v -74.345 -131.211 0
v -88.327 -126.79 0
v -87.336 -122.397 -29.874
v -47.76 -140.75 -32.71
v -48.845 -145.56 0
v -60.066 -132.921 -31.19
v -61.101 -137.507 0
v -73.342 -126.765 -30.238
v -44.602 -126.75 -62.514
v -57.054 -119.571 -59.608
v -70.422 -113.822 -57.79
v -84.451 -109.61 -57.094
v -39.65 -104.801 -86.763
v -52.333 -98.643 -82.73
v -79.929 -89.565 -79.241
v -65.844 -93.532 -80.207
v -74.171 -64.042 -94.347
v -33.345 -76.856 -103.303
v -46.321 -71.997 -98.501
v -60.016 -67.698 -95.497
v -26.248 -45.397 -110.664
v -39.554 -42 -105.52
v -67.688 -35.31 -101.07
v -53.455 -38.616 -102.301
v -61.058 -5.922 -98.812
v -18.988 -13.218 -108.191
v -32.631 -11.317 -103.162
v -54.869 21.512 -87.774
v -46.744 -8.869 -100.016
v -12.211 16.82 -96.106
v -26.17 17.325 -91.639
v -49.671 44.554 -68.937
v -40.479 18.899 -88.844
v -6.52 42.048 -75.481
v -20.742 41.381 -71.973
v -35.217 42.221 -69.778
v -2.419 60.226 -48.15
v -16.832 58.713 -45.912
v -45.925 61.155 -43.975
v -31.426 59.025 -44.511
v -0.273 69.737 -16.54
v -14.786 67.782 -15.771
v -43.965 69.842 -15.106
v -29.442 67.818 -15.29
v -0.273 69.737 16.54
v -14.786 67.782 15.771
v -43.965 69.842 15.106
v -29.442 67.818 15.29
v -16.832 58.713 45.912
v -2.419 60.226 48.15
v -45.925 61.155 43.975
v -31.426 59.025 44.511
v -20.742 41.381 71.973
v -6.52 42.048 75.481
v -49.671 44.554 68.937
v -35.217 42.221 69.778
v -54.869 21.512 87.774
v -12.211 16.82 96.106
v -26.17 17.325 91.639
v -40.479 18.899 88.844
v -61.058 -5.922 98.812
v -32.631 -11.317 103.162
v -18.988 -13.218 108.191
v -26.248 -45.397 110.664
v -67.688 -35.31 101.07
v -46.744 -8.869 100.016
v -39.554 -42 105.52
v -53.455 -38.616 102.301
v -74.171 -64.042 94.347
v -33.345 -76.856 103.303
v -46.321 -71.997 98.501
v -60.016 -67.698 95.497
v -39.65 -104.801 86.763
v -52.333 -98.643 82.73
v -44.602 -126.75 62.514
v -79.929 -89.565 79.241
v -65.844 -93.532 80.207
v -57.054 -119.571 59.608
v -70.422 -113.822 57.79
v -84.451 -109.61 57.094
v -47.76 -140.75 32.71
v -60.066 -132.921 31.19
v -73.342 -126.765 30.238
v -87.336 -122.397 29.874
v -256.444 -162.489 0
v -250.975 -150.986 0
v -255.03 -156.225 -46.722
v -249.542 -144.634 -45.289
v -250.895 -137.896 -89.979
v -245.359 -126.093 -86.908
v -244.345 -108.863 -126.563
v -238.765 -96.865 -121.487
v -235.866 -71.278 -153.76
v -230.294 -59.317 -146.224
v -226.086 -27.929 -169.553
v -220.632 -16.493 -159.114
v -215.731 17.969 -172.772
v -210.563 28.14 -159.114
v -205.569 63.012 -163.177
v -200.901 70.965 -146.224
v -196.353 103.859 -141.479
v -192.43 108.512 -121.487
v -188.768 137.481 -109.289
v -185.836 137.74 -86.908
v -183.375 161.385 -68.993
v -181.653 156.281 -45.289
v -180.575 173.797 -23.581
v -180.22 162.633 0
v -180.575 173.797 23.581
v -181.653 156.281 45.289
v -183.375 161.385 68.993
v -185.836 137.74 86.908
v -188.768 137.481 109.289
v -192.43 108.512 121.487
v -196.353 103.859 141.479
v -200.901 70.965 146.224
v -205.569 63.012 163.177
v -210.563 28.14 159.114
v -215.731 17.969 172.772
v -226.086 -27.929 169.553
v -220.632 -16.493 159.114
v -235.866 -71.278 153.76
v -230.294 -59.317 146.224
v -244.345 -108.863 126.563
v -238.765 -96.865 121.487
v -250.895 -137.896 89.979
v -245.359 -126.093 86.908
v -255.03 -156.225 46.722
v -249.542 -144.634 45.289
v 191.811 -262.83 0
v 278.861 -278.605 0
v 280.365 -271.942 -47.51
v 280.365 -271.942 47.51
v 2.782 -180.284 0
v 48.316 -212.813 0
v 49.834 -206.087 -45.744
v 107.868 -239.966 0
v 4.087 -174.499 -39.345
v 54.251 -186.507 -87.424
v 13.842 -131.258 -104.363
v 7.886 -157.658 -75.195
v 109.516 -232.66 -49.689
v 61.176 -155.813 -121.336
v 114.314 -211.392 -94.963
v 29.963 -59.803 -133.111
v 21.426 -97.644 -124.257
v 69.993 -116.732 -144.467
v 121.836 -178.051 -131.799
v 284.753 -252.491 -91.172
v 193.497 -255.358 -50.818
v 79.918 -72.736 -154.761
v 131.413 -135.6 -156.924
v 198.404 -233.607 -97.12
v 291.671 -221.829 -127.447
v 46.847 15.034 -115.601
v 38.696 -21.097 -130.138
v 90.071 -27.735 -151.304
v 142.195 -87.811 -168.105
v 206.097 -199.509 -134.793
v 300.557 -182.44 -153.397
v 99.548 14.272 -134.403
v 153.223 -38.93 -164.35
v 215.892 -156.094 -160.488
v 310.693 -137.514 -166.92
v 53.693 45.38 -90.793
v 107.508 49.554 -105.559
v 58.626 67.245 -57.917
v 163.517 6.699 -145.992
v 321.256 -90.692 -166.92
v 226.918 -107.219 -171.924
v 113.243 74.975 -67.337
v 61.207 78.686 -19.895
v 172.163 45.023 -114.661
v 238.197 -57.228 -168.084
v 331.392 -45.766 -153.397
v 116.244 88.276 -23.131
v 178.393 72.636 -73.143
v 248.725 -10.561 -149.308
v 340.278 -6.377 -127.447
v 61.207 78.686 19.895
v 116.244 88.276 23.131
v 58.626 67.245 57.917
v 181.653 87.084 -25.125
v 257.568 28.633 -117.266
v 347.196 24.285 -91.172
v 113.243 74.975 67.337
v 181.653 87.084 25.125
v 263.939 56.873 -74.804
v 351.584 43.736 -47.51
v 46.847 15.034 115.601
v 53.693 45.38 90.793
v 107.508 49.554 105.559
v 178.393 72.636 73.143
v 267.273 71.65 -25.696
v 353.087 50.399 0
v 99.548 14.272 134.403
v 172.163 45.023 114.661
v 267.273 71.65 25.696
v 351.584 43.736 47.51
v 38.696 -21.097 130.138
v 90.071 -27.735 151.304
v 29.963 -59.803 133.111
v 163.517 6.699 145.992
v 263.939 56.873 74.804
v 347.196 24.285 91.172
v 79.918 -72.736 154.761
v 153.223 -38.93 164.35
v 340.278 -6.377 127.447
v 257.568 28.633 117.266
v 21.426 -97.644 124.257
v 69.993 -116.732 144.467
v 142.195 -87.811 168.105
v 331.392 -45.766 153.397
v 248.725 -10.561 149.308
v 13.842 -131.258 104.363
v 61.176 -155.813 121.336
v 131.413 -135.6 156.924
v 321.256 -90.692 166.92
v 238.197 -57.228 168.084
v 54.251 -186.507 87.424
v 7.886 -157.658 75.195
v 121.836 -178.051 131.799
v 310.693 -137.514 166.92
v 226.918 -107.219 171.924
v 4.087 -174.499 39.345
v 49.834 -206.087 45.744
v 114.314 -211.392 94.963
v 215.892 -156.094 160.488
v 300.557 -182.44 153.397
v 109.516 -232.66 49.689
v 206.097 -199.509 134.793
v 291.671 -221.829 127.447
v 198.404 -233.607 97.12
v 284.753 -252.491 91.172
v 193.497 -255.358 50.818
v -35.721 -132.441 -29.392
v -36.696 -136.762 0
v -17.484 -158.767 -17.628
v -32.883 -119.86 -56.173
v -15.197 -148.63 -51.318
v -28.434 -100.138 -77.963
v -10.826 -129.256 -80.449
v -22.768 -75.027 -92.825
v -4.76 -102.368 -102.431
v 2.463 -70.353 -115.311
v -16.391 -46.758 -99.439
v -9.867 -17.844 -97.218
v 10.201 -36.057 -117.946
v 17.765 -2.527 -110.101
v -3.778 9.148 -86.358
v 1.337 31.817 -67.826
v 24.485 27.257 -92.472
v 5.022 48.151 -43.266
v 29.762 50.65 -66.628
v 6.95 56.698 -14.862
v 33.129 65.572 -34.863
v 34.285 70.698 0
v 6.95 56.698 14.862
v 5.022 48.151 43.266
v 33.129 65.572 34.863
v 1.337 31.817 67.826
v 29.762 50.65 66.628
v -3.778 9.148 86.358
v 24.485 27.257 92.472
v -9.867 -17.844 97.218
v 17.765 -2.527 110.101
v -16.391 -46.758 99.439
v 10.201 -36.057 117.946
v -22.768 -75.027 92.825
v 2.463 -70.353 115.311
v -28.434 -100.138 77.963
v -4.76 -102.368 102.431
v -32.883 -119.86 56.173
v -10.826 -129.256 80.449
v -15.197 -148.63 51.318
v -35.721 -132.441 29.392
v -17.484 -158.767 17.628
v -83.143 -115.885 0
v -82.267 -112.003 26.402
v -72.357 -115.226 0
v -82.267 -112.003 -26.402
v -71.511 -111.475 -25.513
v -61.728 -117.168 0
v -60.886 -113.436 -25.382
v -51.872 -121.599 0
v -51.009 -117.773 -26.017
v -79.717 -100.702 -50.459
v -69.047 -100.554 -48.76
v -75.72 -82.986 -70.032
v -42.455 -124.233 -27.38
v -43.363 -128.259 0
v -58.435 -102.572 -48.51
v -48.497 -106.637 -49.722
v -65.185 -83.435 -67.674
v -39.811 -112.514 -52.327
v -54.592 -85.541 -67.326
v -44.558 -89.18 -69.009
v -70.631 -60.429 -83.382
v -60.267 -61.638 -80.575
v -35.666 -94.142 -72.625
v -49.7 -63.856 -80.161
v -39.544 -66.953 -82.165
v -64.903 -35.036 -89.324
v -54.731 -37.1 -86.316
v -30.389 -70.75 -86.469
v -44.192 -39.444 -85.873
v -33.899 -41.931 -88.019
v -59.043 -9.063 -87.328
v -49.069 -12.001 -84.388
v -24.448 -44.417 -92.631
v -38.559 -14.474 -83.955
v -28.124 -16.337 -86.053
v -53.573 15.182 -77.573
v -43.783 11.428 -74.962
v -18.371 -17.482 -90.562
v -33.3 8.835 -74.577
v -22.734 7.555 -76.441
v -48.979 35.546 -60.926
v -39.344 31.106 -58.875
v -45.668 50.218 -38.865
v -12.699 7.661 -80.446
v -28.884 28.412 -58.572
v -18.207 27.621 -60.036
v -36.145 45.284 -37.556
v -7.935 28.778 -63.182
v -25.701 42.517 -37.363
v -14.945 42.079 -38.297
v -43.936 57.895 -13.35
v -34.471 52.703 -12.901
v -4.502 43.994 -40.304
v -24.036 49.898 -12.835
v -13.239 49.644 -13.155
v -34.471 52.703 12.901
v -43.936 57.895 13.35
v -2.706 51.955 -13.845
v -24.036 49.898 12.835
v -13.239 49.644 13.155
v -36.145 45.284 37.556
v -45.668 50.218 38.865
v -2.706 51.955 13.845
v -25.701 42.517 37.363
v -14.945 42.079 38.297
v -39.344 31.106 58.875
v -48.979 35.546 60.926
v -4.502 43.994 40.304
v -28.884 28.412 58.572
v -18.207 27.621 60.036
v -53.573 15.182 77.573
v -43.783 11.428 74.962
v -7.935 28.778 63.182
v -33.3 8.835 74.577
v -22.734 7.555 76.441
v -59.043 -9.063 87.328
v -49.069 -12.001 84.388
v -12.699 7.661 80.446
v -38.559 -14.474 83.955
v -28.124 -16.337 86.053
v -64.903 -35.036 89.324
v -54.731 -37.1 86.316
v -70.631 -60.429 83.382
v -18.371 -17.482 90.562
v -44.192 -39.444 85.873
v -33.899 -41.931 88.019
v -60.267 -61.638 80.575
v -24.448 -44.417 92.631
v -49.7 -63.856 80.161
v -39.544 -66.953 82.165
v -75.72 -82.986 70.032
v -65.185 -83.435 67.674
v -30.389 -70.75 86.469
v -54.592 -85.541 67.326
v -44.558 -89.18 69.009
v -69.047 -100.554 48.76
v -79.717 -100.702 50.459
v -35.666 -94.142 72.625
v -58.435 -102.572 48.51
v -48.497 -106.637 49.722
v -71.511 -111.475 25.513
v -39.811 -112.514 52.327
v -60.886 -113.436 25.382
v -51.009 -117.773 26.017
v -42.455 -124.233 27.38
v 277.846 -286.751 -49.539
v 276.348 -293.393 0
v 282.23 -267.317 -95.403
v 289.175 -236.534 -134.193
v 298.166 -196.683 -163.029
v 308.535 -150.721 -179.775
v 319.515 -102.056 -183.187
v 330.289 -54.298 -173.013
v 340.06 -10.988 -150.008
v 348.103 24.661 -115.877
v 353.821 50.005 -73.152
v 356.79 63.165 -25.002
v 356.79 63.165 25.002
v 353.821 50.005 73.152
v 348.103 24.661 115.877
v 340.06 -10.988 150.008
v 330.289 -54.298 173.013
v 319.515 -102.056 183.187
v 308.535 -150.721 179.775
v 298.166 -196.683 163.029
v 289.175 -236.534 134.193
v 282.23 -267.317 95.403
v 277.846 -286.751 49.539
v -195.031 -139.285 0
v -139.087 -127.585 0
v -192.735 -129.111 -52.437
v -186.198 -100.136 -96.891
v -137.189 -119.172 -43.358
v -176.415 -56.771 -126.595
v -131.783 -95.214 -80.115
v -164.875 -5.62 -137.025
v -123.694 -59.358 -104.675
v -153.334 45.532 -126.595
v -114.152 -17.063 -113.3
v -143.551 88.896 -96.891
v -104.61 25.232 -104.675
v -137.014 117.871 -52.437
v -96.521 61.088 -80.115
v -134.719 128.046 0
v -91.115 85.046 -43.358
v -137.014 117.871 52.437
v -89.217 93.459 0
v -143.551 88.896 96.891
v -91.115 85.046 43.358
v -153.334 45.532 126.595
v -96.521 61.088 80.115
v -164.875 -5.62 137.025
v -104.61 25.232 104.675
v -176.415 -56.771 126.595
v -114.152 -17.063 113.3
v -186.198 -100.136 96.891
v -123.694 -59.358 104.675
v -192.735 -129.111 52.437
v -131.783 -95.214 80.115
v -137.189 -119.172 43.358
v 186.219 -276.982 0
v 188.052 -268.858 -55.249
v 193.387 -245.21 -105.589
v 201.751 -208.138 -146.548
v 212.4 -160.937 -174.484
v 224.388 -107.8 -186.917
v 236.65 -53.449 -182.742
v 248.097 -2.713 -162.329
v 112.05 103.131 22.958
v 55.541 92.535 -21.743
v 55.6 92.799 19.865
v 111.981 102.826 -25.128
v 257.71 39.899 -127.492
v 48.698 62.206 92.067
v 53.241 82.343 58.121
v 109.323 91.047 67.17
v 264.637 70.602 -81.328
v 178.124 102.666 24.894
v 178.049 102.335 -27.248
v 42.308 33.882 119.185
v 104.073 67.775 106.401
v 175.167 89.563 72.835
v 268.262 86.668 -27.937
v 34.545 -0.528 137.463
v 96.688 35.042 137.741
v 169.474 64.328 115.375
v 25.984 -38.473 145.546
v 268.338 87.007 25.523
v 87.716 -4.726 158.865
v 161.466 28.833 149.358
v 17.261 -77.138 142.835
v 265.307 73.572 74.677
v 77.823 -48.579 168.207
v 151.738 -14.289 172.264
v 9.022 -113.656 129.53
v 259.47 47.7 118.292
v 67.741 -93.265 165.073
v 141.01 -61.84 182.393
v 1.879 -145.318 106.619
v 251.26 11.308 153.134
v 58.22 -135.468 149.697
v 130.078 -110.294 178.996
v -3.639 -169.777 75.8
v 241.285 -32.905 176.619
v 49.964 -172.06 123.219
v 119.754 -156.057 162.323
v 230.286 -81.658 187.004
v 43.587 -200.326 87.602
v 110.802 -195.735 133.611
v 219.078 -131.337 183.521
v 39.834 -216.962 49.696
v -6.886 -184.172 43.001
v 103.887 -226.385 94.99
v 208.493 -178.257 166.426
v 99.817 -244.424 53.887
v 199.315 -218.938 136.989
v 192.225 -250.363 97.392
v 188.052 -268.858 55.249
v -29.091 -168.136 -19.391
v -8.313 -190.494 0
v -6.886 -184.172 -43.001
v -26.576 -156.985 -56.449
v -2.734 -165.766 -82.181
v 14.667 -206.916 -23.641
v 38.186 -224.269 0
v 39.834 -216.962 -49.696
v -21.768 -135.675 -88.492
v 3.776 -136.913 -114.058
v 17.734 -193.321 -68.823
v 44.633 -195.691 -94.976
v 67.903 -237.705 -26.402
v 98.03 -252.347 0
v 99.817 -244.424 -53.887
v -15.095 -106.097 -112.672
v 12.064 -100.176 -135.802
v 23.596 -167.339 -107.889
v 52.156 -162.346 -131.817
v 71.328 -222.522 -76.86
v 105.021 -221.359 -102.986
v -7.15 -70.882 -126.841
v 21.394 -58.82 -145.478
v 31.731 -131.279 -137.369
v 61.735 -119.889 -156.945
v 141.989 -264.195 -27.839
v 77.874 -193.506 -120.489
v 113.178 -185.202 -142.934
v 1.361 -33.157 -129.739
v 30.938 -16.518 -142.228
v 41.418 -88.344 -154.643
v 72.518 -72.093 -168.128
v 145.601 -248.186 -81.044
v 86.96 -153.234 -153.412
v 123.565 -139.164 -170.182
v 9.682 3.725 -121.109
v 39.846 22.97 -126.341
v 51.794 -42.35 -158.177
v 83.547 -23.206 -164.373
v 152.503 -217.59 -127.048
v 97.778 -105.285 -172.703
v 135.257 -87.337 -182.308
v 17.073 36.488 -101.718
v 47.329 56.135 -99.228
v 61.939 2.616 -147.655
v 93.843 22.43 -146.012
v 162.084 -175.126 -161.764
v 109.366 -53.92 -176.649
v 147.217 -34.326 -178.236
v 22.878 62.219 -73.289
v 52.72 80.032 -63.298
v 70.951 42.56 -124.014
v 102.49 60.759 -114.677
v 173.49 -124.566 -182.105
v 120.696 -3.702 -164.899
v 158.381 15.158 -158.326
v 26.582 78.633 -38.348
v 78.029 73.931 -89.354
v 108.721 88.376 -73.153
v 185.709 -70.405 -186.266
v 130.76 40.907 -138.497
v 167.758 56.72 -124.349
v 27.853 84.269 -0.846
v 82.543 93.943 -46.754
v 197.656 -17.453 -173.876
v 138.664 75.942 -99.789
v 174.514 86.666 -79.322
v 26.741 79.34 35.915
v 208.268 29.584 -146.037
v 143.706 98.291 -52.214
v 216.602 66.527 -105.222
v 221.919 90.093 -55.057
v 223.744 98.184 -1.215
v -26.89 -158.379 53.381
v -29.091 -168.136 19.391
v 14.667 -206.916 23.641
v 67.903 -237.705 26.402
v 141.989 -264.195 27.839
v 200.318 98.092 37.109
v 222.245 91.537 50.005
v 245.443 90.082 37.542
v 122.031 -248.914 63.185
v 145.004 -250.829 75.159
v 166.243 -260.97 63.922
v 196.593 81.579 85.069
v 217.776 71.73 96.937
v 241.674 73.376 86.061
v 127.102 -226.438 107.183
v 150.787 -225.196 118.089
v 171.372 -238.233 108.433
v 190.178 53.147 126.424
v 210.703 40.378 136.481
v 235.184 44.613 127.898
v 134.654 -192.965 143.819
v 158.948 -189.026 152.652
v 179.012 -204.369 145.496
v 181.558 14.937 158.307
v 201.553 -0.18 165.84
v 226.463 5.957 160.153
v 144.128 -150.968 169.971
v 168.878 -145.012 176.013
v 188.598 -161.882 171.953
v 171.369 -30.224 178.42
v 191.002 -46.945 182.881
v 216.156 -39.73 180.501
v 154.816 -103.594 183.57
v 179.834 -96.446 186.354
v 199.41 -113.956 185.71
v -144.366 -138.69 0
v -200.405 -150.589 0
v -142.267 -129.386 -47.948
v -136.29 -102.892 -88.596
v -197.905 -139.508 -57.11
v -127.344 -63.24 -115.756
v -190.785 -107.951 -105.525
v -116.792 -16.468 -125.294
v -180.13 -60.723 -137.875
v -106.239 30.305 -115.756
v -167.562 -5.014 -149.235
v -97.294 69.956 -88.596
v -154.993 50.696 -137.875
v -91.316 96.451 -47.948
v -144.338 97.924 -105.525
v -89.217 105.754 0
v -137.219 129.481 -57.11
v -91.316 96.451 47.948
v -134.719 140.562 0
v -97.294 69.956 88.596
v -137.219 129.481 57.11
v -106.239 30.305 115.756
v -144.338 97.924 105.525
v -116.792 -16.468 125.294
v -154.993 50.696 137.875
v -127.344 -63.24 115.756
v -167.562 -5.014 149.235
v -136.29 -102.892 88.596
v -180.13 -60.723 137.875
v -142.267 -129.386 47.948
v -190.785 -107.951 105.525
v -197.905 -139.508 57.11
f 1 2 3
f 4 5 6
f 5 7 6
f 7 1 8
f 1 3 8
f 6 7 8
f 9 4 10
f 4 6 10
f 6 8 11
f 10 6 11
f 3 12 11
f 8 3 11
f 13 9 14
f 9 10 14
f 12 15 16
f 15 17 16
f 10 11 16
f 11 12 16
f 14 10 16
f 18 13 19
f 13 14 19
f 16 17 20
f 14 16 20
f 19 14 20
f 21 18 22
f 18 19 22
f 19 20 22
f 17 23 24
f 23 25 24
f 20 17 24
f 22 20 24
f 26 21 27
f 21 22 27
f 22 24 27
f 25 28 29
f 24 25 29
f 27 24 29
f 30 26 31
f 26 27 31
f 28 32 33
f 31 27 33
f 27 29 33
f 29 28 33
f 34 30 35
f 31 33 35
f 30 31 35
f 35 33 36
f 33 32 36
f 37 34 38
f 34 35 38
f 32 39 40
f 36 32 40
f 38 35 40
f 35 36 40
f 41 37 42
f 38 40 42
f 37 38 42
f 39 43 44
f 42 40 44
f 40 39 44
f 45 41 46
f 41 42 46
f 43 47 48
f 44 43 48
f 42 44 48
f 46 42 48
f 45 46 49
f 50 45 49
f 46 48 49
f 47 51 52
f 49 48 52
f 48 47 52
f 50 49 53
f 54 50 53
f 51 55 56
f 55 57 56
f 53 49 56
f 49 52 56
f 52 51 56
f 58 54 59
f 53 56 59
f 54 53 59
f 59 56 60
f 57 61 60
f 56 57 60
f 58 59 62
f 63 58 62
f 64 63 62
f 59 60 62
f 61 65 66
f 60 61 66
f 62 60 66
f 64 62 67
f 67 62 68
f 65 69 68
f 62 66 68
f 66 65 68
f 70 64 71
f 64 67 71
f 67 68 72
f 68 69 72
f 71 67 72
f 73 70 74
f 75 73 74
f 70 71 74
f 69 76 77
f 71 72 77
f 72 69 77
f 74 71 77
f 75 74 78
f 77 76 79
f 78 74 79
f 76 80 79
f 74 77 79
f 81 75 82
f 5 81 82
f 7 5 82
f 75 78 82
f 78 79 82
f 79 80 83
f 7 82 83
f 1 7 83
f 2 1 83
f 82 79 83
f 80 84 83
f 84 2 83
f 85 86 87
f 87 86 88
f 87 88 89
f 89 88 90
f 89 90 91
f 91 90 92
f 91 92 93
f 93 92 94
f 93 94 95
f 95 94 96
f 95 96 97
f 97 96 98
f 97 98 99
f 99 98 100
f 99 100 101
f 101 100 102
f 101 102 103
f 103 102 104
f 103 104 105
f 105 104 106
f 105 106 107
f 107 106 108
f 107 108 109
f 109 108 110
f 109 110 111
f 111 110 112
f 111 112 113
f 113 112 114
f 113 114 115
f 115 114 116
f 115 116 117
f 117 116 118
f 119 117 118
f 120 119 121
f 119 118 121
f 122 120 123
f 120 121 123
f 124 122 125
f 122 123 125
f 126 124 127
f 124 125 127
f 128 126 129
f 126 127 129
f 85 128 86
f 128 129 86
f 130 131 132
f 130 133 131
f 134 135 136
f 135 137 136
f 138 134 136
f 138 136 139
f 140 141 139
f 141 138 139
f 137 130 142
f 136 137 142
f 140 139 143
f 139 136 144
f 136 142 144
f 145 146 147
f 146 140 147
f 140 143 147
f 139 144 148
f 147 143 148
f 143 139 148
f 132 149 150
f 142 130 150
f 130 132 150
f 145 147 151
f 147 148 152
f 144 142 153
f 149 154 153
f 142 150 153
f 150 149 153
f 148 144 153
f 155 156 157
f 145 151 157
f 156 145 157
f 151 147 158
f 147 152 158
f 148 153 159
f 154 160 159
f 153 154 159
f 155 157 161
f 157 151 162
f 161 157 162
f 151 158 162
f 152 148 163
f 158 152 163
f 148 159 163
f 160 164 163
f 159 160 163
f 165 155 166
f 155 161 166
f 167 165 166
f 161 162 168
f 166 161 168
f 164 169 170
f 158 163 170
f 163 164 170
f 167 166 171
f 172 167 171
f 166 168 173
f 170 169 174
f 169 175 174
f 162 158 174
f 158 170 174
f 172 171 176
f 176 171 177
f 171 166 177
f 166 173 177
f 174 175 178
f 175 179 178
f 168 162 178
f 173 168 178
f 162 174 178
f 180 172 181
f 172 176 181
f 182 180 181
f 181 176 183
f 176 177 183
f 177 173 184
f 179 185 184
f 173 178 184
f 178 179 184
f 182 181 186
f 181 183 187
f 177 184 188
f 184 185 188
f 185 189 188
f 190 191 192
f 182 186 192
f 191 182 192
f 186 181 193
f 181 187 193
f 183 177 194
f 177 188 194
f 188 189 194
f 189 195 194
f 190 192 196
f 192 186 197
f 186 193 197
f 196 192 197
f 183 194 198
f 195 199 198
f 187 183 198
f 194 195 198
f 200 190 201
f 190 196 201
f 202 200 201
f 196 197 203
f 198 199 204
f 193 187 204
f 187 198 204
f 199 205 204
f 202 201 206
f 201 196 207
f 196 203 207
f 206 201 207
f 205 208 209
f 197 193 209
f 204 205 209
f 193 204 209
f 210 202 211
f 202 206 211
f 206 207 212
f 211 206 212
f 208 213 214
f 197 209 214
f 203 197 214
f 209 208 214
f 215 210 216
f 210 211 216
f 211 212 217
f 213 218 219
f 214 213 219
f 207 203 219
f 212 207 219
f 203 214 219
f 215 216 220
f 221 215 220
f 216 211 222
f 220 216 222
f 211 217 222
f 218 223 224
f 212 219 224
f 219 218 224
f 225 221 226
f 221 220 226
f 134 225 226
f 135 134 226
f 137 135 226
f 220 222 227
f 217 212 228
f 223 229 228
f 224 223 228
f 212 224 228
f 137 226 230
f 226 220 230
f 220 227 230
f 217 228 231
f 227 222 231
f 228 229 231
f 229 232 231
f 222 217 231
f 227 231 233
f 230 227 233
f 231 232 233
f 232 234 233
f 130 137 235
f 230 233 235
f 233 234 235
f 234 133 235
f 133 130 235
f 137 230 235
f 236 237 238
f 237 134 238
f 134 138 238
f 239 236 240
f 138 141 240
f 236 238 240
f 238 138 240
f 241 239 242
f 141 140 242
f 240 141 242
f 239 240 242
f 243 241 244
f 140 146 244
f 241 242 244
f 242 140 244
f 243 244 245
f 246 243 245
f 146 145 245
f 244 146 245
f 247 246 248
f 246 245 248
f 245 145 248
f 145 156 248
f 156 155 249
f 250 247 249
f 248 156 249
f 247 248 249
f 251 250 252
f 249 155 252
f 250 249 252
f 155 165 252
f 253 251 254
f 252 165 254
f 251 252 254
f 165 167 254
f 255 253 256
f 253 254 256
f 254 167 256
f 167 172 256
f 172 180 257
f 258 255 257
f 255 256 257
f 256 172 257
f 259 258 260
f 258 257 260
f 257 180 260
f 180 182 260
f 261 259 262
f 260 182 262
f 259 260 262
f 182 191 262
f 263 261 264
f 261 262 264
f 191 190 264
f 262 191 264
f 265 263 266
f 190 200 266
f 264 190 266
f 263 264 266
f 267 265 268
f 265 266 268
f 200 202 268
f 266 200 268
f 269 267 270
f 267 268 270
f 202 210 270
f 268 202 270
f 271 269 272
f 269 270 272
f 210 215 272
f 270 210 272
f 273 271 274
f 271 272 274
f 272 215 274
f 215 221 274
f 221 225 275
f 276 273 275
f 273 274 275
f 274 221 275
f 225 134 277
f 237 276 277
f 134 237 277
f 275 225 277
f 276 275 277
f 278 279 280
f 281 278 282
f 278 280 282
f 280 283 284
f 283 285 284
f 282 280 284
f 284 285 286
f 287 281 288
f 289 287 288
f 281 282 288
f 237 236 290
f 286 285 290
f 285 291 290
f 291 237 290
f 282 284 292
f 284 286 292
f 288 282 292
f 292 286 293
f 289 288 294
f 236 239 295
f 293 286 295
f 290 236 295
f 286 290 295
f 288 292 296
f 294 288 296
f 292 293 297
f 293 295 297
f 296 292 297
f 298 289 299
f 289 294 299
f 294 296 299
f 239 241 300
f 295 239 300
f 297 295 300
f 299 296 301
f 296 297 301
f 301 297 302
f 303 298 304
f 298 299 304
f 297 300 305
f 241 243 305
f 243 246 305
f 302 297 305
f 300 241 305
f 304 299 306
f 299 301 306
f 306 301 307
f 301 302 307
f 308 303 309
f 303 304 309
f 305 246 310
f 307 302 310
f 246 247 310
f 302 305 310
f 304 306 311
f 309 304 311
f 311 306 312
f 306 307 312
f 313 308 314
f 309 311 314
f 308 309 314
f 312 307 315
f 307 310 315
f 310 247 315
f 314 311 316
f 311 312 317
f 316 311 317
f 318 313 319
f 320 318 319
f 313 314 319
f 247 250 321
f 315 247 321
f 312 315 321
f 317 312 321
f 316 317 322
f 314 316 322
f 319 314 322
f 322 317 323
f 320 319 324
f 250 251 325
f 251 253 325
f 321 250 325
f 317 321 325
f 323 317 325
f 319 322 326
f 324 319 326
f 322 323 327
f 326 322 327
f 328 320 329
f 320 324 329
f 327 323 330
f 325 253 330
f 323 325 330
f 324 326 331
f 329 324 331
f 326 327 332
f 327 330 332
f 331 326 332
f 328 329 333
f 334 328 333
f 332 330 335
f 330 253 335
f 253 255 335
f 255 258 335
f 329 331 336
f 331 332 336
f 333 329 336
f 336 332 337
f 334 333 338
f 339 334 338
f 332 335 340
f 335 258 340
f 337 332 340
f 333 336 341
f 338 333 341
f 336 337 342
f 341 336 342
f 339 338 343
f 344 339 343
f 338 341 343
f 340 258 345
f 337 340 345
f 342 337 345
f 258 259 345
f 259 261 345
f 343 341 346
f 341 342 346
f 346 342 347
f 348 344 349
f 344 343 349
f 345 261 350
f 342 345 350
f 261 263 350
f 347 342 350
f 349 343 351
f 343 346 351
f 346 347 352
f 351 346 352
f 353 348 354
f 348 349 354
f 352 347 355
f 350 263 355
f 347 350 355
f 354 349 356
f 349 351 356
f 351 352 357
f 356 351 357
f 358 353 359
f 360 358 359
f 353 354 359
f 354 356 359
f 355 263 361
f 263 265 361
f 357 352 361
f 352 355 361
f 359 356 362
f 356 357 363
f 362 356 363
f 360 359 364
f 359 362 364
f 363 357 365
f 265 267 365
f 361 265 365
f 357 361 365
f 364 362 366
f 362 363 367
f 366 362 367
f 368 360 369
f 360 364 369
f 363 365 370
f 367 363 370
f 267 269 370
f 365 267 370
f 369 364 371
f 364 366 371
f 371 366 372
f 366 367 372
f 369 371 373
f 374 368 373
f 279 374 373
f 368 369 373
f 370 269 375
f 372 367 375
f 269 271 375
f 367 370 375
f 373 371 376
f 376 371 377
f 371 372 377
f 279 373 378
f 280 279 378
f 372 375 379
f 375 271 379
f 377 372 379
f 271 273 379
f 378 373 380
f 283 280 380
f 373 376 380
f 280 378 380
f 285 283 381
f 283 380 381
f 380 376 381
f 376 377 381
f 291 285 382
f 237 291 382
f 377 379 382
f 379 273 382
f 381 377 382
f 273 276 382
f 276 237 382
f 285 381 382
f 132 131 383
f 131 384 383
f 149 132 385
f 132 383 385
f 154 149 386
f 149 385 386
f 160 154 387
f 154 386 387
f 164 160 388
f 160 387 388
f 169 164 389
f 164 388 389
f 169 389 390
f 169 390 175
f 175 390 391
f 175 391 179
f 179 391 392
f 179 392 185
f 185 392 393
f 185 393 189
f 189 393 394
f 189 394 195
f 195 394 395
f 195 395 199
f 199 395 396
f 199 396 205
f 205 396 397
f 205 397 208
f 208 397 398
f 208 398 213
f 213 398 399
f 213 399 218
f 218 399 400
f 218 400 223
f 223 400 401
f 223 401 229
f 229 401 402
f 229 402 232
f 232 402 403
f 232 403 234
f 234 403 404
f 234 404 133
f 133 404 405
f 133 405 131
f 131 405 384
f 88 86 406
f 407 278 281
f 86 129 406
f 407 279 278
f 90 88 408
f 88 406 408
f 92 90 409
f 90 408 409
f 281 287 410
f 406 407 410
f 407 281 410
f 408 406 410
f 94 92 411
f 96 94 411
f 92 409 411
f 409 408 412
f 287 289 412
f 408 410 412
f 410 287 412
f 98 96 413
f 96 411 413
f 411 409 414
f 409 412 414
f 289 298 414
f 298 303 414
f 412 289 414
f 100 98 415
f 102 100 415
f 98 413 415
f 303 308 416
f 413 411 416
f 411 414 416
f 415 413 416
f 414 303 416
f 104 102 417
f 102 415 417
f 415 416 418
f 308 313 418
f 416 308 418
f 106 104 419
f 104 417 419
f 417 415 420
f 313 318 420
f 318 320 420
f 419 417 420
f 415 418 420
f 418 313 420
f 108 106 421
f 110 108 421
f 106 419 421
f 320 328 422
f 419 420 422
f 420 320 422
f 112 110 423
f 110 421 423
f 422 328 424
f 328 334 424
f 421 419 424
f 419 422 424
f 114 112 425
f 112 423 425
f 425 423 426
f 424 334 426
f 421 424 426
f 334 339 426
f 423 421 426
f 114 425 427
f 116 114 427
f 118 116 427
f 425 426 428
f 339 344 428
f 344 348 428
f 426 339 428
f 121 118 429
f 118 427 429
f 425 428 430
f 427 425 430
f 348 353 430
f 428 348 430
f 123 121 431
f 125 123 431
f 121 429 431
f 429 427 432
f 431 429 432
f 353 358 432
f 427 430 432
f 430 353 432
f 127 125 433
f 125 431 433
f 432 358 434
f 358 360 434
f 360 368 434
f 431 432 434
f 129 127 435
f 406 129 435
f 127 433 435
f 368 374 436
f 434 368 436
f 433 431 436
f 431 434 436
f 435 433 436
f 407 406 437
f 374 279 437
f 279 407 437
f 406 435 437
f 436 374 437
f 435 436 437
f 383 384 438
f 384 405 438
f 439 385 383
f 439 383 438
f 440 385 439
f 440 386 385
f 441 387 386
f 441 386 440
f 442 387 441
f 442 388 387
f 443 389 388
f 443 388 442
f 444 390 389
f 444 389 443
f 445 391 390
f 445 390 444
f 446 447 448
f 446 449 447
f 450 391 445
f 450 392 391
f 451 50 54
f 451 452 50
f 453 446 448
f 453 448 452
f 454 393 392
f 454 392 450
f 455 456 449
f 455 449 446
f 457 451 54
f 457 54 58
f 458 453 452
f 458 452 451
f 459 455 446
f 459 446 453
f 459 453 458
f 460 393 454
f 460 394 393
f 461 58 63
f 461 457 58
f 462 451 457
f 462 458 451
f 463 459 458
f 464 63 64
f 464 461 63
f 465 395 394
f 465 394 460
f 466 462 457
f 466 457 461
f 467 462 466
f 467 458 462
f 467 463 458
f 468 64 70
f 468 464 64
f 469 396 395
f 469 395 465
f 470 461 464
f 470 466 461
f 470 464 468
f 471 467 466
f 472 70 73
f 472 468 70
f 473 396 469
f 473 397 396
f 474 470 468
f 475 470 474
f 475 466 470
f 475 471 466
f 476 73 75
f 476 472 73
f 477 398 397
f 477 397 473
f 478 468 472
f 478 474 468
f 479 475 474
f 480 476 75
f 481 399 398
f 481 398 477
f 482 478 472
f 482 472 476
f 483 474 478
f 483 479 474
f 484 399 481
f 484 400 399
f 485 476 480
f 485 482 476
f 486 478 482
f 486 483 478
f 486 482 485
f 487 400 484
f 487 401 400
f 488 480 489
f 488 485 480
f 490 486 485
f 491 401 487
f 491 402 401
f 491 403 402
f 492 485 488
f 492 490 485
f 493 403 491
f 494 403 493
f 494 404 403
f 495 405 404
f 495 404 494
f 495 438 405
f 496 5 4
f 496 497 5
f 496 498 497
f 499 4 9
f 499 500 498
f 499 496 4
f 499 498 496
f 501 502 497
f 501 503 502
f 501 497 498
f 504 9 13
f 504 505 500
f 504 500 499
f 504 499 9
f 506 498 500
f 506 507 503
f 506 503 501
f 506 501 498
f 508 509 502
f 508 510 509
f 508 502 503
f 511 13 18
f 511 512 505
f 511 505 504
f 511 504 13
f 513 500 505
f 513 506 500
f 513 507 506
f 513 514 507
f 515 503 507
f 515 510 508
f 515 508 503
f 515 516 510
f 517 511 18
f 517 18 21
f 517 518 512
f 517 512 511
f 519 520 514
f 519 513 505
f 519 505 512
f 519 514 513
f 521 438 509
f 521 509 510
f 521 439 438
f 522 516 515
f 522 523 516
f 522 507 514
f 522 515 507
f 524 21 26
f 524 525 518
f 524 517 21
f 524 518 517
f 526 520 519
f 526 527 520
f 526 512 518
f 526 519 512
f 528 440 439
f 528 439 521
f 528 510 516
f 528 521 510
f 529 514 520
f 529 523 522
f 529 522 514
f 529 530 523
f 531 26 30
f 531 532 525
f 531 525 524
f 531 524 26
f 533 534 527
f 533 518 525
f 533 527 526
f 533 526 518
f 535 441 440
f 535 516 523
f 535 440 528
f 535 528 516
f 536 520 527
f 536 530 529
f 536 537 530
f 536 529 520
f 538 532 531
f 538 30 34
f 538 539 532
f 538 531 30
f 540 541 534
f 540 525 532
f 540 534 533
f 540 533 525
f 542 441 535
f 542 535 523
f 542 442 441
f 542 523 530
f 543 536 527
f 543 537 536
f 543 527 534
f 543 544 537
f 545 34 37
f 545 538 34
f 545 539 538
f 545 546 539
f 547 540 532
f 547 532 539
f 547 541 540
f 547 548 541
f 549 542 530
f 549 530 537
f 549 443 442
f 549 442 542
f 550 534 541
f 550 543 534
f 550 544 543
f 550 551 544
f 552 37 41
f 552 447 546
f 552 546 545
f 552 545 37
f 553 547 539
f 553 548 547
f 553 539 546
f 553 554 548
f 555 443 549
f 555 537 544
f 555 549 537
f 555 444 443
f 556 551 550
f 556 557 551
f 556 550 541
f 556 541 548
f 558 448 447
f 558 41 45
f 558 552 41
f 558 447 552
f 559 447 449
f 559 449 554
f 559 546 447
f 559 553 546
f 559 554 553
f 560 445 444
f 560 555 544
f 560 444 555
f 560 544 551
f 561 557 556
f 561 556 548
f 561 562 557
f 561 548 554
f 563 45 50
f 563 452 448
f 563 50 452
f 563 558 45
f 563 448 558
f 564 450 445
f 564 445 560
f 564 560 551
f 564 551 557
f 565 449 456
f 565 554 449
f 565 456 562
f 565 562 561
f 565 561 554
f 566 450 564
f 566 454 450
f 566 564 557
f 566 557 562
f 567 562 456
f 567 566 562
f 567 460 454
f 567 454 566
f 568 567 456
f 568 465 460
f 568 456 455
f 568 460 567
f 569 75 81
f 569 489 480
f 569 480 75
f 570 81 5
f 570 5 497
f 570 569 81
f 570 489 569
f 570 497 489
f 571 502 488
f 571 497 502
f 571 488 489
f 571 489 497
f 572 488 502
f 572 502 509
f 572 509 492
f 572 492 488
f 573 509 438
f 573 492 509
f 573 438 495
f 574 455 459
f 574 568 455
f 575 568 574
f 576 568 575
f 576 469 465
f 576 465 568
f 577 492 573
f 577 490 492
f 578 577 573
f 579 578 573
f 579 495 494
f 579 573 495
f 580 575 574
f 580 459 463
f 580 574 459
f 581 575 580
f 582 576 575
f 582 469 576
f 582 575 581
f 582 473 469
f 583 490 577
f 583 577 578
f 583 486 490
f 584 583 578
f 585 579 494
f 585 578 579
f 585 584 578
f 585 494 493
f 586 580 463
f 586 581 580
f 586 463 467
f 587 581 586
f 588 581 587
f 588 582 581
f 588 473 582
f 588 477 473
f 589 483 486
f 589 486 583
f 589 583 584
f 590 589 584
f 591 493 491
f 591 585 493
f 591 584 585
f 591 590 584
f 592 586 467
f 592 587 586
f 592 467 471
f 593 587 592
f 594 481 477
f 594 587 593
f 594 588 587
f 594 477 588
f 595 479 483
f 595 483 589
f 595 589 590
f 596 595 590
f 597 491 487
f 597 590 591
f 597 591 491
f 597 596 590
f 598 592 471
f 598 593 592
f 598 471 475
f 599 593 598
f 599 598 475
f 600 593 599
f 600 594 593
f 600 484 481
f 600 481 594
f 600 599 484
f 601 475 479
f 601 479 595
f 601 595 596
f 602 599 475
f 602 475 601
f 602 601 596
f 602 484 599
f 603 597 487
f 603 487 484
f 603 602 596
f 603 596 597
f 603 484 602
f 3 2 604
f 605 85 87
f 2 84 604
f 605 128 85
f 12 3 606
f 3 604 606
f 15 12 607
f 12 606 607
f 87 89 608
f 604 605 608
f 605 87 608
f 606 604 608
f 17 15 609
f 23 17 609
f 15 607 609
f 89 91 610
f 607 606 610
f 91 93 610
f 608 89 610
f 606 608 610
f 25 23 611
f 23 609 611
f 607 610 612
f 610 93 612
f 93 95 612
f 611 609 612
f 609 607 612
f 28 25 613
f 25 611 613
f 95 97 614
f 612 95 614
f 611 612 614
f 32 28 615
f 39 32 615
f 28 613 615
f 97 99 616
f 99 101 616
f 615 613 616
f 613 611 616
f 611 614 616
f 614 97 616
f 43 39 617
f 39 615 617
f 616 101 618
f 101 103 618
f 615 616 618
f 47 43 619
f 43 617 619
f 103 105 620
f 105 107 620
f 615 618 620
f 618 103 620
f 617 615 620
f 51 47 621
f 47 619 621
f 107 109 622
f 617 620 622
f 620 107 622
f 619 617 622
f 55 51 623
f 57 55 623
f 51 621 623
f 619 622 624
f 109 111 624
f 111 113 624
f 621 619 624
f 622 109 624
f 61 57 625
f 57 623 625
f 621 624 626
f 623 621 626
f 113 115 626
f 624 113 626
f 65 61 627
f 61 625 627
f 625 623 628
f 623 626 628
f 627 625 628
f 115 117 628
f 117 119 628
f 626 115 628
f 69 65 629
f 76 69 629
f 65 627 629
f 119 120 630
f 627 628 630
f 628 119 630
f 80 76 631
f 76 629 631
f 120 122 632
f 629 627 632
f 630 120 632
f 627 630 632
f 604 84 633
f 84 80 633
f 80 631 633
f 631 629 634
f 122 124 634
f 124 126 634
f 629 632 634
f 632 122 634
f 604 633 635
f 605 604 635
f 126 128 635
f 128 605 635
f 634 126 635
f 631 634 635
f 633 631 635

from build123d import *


with BuildPart() as part:
    # Sketch2 → Revolve2 (revolve)
    with BuildSketch(Plane.XY, mode=Mode.PRIVATE) as revolve2_sk:
        with BuildLine():
            Line((-43.716221153, 70.946214002), (-180.219914565, 175.370357373))
            Line((-180.219914565, 175.370357373), (-180.219914565, 162.632951378))
            Line((-180.219914565, 162.632951378), (-43.716221153, 58.871410928))
            ThreePointArc((-43.716221153, 58.871410928), (-18.430081053, 50.394075819), (7.194859268, 57.78437522))
            add(Edge.make_bspline(
                [(7.194859268, 57.78437522), (8.928872852, 58.732265854), (12.430594707, 60.597595675), (19.407375105, 64.12178198), (28.153172213, 68.187413259), (38.666050393, 72.531541725), (52.717788584, 77.643180346), (70.34822503, 82.805552541), (91.624876371, 87.192047227), (113.029883128, 89.915434257), (141.74154758, 91.515793324), (177.937561467, 90.050923585), (221.72262923, 83.855479767), (265.65937236, 74.370818314), (302.216165626, 64.722148717), (331.352600516, 56.561988678), (345.834640133, 52.448432595), (353.087325703, 50.398999409)],
                knots=[0, 0, 0, 0, 0.015625, 0.03125, 0.0625, 0.09375, 0.125, 0.1875, 0.25, 0.3125, 0.375, 0.5, 0.625, 0.75, 0.875, 0.9375, 1, 1, 1, 1], degree=3))
            Line((353.087325703, 50.398999409), (357.166240613, 64.833764844))
            add(Edge.make_bspline(
                [(0, 70.946214002), (117.631064711, 135.248700165), (241.601433893, 97.489578707), (357.166240613, 64.833764844)],
                knots=[0, 0, 0, 0, 1, 1, 1, 1], degree=3))
            ThreePointArc((0, 70.946214002), (-21.858110577, 68.683063299), (-43.716221153, 70.946214002))
        make_face()
    revolve(revolve2_sk.sketch.rotate(Axis((-43.716221153, -32.954054974, 0), (0.9754826443933732, -0.22007637421429832, 0)), 180), axis=Axis((-43.716221153, -32.954054974, 0), (0.9754826443933732, -0.22007637421429832, 0)))


solid = part.part
